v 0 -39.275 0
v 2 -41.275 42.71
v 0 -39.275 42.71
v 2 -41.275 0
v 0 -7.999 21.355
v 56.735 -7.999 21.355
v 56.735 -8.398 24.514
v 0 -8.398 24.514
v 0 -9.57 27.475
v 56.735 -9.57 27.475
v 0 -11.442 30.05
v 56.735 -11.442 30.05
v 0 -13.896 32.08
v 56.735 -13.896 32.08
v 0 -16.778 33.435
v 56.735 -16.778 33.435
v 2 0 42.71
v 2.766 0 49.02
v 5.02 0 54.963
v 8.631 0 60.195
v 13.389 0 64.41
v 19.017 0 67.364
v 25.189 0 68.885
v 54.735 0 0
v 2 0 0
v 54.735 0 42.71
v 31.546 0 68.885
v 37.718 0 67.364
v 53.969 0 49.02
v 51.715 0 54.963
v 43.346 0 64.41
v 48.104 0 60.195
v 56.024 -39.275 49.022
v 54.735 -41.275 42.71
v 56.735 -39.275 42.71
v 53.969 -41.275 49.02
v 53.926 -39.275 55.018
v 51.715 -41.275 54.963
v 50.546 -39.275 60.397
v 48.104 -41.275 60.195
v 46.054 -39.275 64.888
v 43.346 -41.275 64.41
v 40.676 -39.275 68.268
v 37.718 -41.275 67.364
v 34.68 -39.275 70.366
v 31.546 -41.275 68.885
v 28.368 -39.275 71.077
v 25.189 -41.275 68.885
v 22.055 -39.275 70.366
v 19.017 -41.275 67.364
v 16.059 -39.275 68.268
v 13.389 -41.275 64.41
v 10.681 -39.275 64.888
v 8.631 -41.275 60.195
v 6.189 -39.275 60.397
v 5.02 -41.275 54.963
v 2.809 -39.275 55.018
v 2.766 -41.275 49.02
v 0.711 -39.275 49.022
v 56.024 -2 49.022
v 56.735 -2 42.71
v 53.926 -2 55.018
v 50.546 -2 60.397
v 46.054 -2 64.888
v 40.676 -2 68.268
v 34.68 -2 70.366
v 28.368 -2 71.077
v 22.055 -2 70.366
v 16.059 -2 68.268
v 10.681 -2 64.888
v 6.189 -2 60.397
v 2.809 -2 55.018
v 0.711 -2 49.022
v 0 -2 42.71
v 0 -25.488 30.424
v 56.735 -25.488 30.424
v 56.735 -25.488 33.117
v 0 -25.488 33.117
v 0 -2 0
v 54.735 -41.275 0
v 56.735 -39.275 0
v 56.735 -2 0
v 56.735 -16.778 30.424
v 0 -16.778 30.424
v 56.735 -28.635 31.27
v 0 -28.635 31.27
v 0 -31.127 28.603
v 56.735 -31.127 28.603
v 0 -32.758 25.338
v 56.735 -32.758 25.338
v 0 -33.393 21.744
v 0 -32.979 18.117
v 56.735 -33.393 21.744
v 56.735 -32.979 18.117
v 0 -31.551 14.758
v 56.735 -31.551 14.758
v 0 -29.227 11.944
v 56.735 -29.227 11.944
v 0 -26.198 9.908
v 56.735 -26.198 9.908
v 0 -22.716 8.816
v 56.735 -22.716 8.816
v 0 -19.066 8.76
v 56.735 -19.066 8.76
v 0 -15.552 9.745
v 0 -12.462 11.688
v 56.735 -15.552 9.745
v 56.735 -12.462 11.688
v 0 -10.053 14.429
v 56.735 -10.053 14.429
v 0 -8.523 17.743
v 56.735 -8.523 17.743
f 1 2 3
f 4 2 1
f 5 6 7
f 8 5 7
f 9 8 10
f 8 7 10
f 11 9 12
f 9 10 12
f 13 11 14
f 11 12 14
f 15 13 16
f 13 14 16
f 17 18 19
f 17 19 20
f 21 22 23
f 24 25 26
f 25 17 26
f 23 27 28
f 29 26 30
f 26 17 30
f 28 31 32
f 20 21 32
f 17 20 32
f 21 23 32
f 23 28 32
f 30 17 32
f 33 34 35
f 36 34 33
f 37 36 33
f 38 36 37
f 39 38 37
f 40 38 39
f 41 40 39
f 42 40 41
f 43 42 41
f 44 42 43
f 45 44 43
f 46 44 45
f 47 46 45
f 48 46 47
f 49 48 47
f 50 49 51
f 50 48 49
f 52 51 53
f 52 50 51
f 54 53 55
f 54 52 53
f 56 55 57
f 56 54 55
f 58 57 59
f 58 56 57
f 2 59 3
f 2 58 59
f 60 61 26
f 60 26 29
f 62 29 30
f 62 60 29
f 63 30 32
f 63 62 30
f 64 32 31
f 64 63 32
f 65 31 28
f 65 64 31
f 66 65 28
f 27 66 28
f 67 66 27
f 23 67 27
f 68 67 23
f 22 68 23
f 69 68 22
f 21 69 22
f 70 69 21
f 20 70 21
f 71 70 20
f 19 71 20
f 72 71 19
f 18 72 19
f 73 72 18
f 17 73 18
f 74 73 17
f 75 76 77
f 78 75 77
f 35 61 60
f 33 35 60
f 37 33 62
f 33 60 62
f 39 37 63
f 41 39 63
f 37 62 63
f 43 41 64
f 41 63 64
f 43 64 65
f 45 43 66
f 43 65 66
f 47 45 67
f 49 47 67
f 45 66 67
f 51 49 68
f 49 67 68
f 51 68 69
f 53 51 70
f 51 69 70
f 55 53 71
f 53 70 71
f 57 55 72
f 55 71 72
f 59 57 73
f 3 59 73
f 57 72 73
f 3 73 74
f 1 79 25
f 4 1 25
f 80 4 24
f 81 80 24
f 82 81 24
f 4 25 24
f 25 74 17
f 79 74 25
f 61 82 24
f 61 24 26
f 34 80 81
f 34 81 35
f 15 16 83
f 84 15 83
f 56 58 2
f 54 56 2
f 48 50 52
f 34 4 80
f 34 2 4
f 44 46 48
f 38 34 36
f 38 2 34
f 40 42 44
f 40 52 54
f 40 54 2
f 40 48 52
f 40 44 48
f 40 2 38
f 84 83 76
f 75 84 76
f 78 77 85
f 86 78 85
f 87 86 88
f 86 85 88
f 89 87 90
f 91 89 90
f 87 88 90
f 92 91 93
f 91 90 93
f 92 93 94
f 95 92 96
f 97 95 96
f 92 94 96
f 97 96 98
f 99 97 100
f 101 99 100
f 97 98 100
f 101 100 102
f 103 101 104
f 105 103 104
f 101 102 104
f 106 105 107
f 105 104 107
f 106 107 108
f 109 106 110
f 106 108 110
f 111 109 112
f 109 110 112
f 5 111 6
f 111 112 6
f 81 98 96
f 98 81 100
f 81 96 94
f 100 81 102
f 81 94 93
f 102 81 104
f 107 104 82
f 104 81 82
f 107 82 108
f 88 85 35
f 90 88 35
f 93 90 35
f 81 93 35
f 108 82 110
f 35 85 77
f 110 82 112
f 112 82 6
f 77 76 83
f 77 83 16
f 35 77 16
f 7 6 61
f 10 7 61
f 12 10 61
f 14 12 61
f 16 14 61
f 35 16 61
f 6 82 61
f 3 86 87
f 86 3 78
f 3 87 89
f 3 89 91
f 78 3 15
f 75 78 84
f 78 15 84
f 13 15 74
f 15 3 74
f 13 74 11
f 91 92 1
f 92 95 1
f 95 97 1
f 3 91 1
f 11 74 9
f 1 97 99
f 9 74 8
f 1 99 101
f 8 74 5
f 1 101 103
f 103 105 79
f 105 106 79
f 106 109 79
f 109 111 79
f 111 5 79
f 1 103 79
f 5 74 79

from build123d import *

# Parameters (mm, degrees)
F1_DEPTH = 41.275
F3_DEPTH = 67.31
F4_SIZE  = 2


with BuildPart() as f1:
    # F0 (on Front) → F1 (new body)
    with BuildSketch(Plane.XZ):
        with BuildLine():
            Line((0, 42.709876), (0, 0))
            Line((0, 0), (56.735039, 0))
            Line((56.735039, 0), (56.735039, 42.709876))
            ThreePointArc((56.735039, 42.709876), (28.367519, 71.077395), (0, 42.709876))
        make_face()
    extrude(amount=F1_DEPTH)

    # F2 (on face) → F3 (cut)
    with BuildSketch(Plane.YZ.offset(56.735039)):
        with BuildLine():
            ThreePointArc((-25.487708, 33.117347), (-27.786179, 10.816629), (-7.998581, 21.354938))
            ThreePointArc((-7.998581, 21.354938), (-10.42517, 28.821331), (-16.77764, 33.434517))
            Line((-16.77764, 33.434517), (-16.77764, 30.423621))
            Line((-16.77764, 30.423621), (-25.487708, 30.423621))
            Line((-25.487708, 30.423621), (-25.487708, 33.117347))
        make_face()
    extrude(amount=-F3_DEPTH, mode=Mode.SUBTRACT)

    # F4
    f4_edges = [f1.edges().sort_by_distance(p)[0] for p in [
        (28.367519, -41.275, 71.077395),
        (56.735039, 0, 21.354938),
    ]]
    chamfer(f4_edges, length=F4_SIZE)


solid = f1.part
